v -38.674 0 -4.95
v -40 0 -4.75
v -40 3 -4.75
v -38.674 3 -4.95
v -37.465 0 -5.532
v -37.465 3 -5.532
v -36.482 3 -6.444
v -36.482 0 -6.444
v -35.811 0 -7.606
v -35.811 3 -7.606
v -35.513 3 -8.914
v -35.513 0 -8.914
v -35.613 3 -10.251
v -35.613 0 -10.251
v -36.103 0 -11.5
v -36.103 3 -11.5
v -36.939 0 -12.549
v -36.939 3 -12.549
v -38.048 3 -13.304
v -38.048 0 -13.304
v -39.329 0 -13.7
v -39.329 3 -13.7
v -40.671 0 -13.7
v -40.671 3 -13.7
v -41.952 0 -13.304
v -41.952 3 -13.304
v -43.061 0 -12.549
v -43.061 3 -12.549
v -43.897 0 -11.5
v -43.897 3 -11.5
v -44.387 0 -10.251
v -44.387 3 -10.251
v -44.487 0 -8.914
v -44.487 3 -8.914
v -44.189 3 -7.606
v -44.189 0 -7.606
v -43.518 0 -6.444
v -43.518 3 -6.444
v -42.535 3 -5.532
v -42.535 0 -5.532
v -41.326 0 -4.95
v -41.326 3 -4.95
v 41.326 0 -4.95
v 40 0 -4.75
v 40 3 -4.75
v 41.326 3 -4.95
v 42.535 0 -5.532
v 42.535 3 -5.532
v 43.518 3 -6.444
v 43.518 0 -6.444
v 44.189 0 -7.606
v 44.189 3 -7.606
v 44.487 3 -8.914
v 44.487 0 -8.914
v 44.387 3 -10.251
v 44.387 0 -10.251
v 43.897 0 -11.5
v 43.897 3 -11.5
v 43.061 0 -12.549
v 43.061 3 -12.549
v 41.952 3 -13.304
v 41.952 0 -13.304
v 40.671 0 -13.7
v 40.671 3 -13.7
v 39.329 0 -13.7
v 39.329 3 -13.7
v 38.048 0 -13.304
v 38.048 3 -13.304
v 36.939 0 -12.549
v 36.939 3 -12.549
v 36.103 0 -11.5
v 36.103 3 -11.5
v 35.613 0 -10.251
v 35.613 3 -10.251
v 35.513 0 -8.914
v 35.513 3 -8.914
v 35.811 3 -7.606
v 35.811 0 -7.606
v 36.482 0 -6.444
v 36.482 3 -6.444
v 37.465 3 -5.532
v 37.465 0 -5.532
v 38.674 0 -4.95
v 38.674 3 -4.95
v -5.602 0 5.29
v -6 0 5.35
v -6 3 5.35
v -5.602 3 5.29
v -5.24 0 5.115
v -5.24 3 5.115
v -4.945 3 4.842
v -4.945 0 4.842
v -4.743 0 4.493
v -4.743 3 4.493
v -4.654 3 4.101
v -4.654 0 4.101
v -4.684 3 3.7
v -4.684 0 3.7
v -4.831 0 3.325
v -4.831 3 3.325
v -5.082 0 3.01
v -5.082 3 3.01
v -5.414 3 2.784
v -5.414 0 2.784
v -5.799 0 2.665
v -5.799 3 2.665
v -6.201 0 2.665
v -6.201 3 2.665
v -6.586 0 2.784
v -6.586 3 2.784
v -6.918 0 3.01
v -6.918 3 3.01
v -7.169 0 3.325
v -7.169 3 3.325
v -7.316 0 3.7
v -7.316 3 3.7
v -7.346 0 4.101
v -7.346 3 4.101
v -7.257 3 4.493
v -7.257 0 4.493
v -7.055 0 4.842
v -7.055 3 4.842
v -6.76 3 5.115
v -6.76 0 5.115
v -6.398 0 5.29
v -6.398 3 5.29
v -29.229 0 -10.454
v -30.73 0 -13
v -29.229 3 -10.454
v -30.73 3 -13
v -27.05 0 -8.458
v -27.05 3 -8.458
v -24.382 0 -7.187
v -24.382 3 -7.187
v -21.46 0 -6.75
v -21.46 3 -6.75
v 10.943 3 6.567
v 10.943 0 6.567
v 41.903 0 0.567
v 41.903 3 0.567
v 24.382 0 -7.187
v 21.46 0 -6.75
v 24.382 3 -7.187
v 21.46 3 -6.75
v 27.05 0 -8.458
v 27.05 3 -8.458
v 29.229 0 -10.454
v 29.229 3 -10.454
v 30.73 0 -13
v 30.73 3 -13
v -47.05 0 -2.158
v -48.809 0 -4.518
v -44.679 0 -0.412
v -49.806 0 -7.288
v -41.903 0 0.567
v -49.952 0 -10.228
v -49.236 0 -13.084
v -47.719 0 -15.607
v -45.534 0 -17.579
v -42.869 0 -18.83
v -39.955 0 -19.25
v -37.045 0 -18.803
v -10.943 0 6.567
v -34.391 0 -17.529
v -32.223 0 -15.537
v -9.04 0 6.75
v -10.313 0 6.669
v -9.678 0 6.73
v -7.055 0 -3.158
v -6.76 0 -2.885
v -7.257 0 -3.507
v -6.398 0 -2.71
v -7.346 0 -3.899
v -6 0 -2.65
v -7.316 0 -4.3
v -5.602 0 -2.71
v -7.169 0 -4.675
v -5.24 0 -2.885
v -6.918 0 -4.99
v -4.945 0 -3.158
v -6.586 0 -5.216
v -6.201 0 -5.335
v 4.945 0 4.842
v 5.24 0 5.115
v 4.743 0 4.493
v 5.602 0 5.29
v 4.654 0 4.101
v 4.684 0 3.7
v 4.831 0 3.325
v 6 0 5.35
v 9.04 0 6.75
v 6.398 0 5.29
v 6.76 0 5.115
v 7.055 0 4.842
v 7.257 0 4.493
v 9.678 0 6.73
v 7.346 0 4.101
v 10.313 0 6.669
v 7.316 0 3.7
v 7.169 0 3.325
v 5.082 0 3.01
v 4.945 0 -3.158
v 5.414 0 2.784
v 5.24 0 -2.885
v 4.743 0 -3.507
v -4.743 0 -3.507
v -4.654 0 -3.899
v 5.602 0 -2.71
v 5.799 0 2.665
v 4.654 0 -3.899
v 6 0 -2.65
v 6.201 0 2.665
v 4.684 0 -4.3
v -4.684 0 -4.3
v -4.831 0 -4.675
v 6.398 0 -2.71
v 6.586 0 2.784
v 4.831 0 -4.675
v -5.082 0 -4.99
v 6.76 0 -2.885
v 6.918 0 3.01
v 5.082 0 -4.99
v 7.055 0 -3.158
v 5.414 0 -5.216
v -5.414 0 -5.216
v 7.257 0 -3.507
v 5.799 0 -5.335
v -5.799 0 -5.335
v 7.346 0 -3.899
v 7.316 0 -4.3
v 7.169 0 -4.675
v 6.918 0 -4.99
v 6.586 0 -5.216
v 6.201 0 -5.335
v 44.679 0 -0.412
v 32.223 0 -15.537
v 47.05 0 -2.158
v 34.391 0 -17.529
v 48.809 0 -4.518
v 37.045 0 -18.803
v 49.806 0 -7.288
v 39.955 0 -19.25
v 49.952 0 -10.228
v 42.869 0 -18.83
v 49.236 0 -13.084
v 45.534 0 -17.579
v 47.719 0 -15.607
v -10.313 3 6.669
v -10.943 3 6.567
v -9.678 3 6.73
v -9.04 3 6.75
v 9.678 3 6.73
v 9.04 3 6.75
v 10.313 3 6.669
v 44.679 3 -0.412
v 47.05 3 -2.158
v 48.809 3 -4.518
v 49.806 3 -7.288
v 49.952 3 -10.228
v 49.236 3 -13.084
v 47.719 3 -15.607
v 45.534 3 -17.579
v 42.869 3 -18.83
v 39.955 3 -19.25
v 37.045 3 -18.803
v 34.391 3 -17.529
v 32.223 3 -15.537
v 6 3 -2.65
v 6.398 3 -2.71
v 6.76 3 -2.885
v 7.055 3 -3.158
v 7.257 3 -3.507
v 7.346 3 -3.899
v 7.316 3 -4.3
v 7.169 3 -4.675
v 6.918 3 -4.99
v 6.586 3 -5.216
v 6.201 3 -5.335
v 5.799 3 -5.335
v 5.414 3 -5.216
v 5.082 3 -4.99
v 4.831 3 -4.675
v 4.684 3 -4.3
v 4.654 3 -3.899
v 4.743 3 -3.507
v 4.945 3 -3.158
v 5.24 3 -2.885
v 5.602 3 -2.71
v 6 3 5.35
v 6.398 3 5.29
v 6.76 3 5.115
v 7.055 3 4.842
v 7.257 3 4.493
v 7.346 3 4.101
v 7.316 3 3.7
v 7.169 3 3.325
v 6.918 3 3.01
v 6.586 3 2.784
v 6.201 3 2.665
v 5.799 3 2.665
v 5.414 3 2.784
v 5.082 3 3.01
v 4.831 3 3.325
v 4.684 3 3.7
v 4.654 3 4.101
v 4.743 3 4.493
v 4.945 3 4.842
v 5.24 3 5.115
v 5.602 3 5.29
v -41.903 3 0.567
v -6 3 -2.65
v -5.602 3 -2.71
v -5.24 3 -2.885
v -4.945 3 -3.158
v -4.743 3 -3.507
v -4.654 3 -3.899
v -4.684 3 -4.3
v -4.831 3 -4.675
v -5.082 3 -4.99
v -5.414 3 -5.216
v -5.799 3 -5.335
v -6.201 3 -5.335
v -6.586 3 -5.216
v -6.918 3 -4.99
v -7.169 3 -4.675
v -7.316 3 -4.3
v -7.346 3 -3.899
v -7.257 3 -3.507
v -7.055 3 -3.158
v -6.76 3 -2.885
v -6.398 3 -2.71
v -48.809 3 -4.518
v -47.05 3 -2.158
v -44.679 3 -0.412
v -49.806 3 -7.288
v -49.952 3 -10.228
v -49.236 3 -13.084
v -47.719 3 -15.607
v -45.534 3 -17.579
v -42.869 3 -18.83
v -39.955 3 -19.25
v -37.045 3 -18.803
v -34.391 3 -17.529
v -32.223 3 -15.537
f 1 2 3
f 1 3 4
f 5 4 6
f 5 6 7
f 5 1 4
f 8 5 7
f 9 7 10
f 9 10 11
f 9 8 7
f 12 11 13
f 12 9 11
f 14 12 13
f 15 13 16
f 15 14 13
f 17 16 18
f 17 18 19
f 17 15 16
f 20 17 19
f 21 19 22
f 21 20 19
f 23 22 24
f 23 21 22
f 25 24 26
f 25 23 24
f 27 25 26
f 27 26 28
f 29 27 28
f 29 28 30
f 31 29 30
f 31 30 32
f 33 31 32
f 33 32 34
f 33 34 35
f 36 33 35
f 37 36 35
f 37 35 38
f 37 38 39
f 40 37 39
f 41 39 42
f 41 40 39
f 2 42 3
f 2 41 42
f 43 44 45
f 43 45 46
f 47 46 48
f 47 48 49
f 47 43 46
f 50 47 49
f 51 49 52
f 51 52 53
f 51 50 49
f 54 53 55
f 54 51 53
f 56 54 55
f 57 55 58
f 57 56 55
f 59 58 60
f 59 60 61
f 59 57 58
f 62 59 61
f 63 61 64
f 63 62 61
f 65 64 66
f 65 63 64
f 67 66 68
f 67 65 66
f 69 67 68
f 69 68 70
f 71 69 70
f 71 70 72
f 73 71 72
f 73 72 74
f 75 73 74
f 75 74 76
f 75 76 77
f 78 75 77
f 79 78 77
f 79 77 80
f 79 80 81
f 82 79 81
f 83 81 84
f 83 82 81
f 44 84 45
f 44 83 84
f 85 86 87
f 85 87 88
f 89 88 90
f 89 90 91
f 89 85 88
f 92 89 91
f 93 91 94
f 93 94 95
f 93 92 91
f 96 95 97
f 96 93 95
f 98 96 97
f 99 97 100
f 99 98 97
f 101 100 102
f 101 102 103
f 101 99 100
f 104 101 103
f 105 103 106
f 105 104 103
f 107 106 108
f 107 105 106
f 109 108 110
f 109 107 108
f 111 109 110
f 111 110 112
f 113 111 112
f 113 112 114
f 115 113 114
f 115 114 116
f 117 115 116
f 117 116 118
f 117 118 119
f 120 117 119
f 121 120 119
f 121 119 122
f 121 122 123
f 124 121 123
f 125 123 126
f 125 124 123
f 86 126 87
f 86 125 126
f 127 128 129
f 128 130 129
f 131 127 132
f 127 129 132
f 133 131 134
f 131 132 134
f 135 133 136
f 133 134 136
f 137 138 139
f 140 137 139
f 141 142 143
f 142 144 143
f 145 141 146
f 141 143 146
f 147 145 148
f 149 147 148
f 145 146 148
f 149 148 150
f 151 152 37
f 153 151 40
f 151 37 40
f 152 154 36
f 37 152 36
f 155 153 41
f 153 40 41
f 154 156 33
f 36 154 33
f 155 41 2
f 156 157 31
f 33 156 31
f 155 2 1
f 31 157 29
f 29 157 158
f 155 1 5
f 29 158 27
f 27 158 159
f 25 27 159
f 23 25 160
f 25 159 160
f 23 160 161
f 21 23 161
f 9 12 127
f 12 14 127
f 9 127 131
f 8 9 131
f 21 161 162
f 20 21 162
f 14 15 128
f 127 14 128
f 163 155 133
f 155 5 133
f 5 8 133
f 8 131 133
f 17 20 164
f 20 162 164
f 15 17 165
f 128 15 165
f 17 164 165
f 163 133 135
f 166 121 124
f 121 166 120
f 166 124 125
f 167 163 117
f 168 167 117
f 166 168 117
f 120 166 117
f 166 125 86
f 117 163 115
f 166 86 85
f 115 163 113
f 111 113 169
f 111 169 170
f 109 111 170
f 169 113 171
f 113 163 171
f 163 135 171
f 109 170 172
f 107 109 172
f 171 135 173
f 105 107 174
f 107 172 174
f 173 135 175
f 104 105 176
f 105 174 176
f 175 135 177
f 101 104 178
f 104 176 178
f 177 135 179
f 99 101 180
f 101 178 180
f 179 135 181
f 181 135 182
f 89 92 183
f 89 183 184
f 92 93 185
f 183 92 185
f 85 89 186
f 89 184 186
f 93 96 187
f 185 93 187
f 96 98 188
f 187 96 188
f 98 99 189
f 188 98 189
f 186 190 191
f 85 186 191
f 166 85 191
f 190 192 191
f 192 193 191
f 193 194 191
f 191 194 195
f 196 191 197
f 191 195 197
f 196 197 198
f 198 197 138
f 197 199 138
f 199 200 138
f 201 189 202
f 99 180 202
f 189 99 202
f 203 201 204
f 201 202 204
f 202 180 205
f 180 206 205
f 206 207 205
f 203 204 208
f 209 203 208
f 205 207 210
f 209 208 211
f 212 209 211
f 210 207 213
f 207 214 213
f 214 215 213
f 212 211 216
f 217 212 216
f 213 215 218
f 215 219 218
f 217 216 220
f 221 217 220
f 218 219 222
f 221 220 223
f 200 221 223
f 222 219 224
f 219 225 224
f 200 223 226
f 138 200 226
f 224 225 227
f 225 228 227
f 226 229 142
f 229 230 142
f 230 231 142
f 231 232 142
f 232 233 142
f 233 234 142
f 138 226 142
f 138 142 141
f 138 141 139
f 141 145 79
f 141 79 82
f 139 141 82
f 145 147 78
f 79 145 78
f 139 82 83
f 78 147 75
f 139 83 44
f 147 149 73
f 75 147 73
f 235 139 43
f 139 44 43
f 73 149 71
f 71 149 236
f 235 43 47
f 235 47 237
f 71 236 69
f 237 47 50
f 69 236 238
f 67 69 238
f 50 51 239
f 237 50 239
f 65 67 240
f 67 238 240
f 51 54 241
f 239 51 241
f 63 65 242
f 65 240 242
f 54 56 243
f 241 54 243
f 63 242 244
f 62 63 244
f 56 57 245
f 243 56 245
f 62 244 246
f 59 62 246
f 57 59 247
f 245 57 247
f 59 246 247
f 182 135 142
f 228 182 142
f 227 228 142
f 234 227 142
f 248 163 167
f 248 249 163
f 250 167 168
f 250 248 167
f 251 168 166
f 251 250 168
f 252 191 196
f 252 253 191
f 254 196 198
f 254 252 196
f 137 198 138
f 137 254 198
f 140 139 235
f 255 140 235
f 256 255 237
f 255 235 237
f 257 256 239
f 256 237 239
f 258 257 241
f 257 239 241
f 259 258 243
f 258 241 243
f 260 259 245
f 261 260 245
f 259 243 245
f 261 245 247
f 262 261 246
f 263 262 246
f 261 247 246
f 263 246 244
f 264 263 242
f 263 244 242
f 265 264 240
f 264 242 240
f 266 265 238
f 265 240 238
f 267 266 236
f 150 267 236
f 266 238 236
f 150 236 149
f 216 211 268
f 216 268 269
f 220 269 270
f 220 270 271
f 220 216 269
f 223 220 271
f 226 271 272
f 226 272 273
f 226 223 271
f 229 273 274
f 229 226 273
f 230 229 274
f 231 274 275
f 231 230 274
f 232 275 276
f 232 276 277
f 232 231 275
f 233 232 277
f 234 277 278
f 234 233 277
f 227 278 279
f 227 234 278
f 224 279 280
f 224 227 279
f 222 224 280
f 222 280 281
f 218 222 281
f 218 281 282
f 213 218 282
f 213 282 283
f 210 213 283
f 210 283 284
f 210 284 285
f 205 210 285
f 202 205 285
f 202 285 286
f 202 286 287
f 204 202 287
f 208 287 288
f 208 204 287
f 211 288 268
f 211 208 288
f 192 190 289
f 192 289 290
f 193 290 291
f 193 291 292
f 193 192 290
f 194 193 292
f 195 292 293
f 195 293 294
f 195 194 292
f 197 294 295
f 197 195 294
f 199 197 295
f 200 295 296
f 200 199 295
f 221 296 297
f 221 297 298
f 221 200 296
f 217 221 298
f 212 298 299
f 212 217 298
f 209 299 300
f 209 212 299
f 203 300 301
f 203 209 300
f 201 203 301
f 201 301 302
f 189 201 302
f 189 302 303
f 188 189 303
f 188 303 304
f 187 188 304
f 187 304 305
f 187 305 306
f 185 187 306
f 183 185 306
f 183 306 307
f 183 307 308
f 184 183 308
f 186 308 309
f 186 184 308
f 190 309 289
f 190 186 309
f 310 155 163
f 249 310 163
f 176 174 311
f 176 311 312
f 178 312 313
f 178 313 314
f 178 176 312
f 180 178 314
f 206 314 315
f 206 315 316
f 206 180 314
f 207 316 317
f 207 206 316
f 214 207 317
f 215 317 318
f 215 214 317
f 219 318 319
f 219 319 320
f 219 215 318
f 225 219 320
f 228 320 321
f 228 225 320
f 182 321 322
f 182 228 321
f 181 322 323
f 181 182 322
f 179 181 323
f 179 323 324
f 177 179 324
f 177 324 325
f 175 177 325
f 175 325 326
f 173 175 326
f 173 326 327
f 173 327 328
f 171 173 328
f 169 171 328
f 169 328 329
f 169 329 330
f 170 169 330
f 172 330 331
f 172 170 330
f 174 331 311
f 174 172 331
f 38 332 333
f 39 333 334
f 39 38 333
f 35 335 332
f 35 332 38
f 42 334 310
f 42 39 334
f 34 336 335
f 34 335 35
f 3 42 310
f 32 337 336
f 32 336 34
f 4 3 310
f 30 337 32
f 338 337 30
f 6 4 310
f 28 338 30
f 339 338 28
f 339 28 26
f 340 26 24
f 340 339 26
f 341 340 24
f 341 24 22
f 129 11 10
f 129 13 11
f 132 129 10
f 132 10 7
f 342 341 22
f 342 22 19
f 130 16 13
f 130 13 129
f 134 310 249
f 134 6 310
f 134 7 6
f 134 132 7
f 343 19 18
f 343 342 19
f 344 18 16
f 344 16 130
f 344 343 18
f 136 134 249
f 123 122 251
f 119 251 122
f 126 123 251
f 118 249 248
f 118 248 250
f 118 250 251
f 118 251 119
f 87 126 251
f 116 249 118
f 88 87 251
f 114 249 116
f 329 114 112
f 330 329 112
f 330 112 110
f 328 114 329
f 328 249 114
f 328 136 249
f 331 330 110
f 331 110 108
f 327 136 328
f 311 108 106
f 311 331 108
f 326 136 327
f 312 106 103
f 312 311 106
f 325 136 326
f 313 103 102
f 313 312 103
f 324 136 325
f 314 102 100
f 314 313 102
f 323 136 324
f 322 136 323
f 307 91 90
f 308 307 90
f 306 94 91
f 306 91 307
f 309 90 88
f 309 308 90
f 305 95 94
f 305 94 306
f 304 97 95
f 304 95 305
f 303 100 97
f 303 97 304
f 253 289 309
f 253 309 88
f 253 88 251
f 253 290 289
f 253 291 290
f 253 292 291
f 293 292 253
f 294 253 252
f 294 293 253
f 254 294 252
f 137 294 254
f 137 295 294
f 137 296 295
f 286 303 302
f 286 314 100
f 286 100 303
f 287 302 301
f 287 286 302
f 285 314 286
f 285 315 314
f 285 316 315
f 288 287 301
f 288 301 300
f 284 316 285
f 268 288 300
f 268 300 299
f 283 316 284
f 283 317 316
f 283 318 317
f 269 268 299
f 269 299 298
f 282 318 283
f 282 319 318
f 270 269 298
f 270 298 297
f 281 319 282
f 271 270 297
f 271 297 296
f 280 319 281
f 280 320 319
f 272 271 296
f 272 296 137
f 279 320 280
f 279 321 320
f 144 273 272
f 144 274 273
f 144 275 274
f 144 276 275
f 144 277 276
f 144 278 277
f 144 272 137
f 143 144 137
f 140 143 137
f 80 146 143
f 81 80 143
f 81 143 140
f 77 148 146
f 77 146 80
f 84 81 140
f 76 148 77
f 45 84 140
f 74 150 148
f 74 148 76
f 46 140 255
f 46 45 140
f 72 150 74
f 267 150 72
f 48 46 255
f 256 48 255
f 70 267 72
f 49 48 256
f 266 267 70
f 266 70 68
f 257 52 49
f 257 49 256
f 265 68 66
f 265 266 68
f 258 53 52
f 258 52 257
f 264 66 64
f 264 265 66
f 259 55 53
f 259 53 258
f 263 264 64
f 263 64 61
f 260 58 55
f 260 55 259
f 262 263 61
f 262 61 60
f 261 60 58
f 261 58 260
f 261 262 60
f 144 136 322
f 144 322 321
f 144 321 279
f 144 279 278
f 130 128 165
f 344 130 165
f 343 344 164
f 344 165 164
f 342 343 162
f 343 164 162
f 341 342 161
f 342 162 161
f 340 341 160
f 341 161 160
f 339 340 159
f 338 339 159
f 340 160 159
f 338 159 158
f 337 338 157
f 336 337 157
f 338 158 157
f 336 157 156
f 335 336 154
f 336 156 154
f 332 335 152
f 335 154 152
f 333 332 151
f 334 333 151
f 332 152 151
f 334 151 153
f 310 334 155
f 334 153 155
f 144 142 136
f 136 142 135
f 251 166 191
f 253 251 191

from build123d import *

# Parameters (mm, degrees)
SKETCH_1_R      = 4.5
SKETCH_1_R_2    = 1.35
EXTRUDE_1_DEPTH = 3
FILLET_1_R      = 10
FILLET_2_R      = 10


with BuildPart() as part:
    # 草图1 → 凸台-拉伸1 (new body)
    with BuildSketch(Plane(origin=(0, 0, 0), x_dir=(1, 0, 0), z_dir=(0, 1, 0))):
        with BuildLine():
            Line((-41.902581816, -0.567340904), (-10, -6.75))
            Line((-10, -6.75), (10, -6.75))
            Line((10, -6.75), (41.902581816, -0.567340904))
            ThreePointArc((41.902581816, -0.567340904), (45.340176894, 17.704733038), (30.317541634, 6.75))
            Line((30.317541634, 6.75), (-30.317541634, 6.75))
            ThreePointArc((-30.317541634, 6.75), (-45.340176894, 17.704733038), (-41.902581816, -0.567340904))
        make_face()
        with Locations(Location((-40, 9.25, 0), (0, 0, 270))):
            Circle(SKETCH_1_R, mode=Mode.SUBTRACT)
        with Locations(Location((-6, -4, 0), (0, 0, 270))):
            Circle(SKETCH_1_R_2, mode=Mode.SUBTRACT)
        with Locations(Location((-6, 4, 0), (0, 0, 270))):
            Circle(SKETCH_1_R_2, mode=Mode.SUBTRACT)
        with Locations(Location((6, -4, 0), (0, 0, 270))):
            Circle(SKETCH_1_R_2, mode=Mode.SUBTRACT)
        with Locations(Location((6, 4, 0), (0, 0, 270))):
            Circle(SKETCH_1_R_2, mode=Mode.SUBTRACT)
        with Locations(Location((40, 9.25, 0), (0, 0, 270))):
            Circle(SKETCH_1_R, mode=Mode.SUBTRACT)
    extrude(amount=EXTRUDE_1_DEPTH)

    # 圆角1
    fillet_1_edges = [part.edges().sort_by_distance(p)[0] for p in [
        (-30.317541634, 1.5, -6.75),
        (30.317541634, 1.5, -6.75),
    ]]
    fillet(fillet_1_edges, radius=FILLET_1_R)

    # 圆角2
    fillet_2_edges = [part.edges().sort_by_distance(p)[0] for p in [
        (10, 1.5, 6.75),
        (-10, 1.5, 6.75),
    ]]
    fillet(fillet_2_edges, radius=FILLET_2_R)


solid = part.part
